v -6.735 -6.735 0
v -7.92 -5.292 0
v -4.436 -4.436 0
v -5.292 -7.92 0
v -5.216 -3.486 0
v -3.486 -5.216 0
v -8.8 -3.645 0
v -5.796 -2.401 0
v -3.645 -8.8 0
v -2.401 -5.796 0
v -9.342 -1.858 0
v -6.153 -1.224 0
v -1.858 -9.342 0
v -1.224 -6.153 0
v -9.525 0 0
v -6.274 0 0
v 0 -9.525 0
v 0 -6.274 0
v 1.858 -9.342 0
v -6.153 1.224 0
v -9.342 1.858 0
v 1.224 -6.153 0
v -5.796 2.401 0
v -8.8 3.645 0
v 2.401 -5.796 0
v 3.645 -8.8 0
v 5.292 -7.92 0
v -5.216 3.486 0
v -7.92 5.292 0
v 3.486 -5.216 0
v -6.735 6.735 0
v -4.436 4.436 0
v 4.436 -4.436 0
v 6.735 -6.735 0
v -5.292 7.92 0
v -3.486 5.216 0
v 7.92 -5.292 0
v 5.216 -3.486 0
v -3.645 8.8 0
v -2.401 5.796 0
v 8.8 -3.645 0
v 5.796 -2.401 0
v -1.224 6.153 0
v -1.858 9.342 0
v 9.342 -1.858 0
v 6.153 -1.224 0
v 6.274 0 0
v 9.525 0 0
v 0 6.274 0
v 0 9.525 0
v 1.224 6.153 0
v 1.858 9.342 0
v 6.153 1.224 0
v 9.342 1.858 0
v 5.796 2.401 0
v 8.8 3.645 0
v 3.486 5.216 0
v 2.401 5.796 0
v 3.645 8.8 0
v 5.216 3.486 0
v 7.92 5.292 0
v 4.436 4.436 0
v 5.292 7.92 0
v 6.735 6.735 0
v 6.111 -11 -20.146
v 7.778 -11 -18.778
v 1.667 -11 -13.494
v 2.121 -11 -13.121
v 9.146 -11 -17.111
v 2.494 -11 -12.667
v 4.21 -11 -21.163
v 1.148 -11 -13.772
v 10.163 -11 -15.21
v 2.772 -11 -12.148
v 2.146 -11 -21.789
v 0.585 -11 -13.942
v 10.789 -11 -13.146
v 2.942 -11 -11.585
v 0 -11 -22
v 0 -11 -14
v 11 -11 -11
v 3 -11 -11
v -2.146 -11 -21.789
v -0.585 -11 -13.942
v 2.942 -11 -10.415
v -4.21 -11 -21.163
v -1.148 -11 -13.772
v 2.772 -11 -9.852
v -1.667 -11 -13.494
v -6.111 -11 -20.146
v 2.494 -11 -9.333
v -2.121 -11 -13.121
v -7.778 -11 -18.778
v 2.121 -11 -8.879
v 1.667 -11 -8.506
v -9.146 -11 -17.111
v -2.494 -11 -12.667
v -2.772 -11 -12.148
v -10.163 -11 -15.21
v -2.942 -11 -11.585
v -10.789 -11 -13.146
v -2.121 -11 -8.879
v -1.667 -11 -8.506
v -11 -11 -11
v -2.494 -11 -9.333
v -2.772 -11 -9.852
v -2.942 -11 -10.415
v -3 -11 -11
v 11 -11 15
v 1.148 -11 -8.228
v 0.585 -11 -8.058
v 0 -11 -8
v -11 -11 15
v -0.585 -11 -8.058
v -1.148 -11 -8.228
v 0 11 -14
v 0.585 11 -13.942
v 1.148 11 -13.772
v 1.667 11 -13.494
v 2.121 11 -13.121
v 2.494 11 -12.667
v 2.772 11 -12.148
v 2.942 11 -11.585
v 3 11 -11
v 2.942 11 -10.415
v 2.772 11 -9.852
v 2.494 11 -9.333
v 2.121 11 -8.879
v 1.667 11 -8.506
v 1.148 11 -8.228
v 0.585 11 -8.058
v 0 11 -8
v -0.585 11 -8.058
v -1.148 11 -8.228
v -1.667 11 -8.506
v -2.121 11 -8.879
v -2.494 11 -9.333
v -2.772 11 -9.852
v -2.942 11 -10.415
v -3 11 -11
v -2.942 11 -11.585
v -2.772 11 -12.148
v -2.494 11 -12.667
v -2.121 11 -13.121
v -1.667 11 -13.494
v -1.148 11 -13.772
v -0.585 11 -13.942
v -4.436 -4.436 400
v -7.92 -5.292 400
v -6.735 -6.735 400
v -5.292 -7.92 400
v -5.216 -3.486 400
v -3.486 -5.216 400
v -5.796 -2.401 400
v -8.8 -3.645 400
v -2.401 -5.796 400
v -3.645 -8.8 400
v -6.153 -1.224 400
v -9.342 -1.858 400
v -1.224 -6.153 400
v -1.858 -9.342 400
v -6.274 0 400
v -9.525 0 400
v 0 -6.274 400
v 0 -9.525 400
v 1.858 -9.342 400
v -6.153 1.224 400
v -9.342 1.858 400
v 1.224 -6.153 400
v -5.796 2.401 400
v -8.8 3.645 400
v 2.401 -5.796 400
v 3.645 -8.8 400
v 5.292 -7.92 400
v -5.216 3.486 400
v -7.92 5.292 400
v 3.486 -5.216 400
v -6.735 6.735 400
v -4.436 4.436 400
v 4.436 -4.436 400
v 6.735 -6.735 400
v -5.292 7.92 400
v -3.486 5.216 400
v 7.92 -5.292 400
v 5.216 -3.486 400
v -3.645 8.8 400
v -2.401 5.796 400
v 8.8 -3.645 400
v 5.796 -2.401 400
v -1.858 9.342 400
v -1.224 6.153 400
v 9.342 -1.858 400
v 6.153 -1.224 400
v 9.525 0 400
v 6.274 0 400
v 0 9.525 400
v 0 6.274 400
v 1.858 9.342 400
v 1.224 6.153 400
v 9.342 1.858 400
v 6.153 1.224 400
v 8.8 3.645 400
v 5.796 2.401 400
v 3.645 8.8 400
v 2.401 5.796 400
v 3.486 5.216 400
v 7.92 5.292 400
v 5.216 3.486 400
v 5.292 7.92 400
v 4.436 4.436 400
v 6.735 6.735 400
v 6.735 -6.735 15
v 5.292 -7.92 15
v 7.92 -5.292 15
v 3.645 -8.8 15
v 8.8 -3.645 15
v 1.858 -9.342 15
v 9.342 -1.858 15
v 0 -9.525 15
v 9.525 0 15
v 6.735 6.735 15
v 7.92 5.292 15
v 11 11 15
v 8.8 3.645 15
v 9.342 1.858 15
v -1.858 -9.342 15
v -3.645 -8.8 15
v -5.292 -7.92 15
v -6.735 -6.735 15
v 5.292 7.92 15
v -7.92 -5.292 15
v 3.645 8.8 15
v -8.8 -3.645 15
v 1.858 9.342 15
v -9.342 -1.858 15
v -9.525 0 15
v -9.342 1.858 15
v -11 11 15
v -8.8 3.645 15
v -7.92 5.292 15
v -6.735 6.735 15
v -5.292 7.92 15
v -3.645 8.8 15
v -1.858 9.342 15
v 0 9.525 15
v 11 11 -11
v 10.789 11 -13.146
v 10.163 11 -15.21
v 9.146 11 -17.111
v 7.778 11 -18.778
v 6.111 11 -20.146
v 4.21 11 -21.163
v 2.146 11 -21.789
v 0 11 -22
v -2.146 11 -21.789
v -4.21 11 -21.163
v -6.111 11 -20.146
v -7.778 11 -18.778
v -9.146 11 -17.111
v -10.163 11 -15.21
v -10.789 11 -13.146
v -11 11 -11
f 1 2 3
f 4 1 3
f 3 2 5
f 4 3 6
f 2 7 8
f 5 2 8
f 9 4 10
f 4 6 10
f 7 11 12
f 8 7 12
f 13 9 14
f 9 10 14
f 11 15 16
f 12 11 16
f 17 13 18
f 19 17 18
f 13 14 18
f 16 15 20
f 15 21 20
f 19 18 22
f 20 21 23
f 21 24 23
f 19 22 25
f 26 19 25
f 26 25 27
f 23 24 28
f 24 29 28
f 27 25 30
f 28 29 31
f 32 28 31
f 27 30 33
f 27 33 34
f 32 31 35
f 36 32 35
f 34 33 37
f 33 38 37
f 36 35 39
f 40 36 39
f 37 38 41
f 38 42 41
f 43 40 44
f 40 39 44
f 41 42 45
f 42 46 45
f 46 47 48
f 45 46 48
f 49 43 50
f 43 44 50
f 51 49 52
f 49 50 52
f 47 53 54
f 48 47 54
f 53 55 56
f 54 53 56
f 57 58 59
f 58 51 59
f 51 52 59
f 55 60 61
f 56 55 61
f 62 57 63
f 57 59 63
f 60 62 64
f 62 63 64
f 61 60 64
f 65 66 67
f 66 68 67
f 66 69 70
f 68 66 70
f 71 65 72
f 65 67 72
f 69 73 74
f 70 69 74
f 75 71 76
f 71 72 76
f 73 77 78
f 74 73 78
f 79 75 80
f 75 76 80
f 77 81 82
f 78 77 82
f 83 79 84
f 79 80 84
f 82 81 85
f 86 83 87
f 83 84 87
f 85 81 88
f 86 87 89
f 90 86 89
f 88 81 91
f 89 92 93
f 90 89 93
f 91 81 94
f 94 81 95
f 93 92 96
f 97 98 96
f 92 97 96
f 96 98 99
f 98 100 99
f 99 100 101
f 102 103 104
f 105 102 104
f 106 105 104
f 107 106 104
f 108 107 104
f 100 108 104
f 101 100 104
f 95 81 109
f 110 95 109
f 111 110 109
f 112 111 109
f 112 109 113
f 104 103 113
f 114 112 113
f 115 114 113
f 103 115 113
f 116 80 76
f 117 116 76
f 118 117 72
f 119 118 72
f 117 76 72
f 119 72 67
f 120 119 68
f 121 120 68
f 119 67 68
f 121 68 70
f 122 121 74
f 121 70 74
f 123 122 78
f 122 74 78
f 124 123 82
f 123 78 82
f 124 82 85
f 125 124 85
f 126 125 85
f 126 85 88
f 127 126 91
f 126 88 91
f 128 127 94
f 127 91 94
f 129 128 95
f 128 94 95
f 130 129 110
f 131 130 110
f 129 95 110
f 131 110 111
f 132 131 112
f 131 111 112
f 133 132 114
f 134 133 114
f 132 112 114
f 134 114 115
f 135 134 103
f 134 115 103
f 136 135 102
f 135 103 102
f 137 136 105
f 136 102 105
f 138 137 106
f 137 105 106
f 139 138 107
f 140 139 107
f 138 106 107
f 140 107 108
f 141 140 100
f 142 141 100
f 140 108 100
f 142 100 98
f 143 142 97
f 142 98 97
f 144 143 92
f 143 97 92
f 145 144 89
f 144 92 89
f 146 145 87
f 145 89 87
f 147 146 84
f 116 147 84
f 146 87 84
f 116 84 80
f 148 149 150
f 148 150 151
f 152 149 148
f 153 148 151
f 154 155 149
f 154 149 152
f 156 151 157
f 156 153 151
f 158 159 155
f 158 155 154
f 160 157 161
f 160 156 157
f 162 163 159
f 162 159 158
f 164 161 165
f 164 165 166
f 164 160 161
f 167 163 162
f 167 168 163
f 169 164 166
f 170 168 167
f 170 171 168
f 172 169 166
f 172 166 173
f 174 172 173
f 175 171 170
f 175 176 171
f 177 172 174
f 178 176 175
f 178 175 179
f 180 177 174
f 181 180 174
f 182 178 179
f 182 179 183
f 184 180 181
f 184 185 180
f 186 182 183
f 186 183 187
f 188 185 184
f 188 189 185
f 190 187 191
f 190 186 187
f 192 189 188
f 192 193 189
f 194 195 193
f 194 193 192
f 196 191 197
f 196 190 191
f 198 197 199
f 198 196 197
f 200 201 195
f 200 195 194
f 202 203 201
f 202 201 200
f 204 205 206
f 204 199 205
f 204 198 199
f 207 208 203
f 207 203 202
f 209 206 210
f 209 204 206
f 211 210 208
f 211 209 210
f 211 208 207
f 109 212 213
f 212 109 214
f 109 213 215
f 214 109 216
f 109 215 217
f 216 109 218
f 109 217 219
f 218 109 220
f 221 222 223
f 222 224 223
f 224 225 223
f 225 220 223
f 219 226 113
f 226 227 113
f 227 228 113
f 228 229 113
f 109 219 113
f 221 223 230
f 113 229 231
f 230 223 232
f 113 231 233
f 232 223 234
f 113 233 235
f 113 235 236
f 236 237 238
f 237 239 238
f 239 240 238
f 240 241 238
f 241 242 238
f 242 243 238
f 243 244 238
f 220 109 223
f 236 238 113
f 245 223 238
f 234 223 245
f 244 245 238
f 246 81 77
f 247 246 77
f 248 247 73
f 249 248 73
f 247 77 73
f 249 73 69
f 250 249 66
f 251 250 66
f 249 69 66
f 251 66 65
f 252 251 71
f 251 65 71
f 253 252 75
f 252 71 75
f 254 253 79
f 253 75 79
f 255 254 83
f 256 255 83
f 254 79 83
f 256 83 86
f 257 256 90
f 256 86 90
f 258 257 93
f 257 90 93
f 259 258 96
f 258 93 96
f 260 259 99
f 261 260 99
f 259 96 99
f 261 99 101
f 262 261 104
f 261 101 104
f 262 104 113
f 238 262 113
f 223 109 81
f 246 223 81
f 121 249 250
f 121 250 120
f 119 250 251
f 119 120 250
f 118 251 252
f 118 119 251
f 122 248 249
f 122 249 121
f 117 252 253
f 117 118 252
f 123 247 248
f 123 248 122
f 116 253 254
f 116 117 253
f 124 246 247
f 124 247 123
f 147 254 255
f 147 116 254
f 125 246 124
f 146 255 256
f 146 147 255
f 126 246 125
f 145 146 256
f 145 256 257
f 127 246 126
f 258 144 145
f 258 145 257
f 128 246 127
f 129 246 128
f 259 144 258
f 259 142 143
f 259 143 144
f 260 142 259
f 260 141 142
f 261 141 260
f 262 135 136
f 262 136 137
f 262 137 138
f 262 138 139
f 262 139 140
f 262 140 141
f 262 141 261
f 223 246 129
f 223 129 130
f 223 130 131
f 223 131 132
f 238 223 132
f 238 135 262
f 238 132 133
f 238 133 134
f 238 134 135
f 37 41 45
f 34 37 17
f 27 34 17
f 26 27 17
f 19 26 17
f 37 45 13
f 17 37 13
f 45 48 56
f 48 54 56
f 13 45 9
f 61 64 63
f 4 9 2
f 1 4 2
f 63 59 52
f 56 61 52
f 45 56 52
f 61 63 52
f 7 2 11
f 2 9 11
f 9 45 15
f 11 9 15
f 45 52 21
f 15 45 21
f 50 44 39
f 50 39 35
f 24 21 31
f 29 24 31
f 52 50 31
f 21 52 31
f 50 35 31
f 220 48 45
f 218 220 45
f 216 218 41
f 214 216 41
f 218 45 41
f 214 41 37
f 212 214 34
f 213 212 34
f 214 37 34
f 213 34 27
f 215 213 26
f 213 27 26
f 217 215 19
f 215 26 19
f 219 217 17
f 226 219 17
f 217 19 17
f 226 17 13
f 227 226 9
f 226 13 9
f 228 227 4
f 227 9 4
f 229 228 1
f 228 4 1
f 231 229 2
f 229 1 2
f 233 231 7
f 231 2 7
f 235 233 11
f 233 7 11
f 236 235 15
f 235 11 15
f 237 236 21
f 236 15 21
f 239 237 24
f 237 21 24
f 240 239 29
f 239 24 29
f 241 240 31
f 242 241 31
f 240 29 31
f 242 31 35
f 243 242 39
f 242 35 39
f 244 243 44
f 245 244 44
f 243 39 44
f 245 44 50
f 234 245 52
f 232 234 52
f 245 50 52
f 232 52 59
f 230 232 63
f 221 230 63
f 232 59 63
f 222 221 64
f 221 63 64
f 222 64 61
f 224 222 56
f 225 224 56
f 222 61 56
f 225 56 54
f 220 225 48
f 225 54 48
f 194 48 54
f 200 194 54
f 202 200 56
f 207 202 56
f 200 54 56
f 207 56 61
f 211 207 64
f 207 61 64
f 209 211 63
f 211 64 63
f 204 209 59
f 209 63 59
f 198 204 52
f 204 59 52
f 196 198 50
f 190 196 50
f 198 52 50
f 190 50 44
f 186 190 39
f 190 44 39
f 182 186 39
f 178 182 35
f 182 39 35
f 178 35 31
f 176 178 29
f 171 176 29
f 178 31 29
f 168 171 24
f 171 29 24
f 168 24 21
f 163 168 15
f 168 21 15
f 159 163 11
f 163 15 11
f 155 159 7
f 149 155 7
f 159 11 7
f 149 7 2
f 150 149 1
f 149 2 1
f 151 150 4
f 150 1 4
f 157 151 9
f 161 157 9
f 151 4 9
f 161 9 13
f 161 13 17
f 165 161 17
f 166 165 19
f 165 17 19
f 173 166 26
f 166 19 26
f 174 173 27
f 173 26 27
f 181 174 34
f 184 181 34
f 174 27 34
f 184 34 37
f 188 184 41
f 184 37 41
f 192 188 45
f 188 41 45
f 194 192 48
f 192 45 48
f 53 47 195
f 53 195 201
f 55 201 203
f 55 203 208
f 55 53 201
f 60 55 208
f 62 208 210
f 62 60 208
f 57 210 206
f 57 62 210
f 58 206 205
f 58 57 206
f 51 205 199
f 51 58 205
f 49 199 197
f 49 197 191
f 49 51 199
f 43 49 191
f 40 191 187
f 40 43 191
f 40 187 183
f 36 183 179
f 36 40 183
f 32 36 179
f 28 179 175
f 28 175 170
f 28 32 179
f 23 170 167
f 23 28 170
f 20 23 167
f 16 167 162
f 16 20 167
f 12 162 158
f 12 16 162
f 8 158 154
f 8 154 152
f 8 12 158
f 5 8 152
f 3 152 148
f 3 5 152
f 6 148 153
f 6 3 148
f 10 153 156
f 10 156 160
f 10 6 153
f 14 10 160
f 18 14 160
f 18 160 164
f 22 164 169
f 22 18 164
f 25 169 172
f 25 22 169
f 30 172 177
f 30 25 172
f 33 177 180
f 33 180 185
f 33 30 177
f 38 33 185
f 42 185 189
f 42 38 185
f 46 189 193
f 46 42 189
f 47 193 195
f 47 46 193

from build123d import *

# Parameters (mm, degrees)
SKETCH1_R           = 9.525
SKETCH1_R_2         = 6.2738
BOSS_EXTRUDE1_DEPTH = 400
SKETCH2_W           = 22
SKETCH2_H           = 22
SKETCH2_R           = 9.525
BOSS_EXTRUDE2_DEPTH = 15
SKETCH2_2_W         = 22
SKETCH2_2_H         = 22
BOSS_EXTRUDE3_DEPTH = 2
SKETCH3_R           = 3
BOSS_EXTRUDE4_DEPTH = 22


with BuildPart() as part:
    # Sketch1 → Boss-Extrude1 (new body)
    with BuildSketch(Plane.XY):
        Circle(SKETCH1_R)
        Circle(SKETCH1_R_2, mode=Mode.SUBTRACT)
    extrude(amount=BOSS_EXTRUDE1_DEPTH)


with BuildPart() as body_2:
    # Sketch2 → Boss-Extrude2 (new body)
    with BuildSketch(Plane(origin=(0, 0, 0), x_dir=(-1, 0, 0), z_dir=(0, 0, -1))):
        Rectangle(SKETCH2_W, SKETCH2_H)
        with Locations(Location((0, 0, 0), (0, 0, 180))):
            Circle(SKETCH2_R, mode=Mode.SUBTRACT)
    extrude(amount=-BOSS_EXTRUDE2_DEPTH)


with BuildPart() as body_3:
    # Sketch2<2> → Boss-Extrude3 (new body)
    with BuildSketch(Plane(origin=(0, 0, 0), x_dir=(-1, 0, 0), z_dir=(0, 0, -1))):
        Rectangle(SKETCH2_2_W, SKETCH2_2_H)
    extrude(amount=BOSS_EXTRUDE3_DEPTH)


with BuildPart() as body_2_1:
    add(body_2.part)

    # Combine1: union body 3
    add(body_3.part)

    # Sketch3 → Boss-Extrude4 (add)
    with BuildSketch(Plane.XZ.offset(11)):
        with BuildLine():
            Line((11, -2), (11, -11))
            ThreePointArc((11, -11), (0, -22), (-11, -11))
            Line((-11, -11), (-11, -2))
            Line((-11, -2), (11, -2))
        make_face()
        with Locations(Location((0, -11, 0), (0, 0, 270))):
            Circle(SKETCH3_R, mode=Mode.SUBTRACT)
    extrude(amount=-BOSS_EXTRUDE4_DEPTH)


solid = Compound([part.part, body_2_1.part])
